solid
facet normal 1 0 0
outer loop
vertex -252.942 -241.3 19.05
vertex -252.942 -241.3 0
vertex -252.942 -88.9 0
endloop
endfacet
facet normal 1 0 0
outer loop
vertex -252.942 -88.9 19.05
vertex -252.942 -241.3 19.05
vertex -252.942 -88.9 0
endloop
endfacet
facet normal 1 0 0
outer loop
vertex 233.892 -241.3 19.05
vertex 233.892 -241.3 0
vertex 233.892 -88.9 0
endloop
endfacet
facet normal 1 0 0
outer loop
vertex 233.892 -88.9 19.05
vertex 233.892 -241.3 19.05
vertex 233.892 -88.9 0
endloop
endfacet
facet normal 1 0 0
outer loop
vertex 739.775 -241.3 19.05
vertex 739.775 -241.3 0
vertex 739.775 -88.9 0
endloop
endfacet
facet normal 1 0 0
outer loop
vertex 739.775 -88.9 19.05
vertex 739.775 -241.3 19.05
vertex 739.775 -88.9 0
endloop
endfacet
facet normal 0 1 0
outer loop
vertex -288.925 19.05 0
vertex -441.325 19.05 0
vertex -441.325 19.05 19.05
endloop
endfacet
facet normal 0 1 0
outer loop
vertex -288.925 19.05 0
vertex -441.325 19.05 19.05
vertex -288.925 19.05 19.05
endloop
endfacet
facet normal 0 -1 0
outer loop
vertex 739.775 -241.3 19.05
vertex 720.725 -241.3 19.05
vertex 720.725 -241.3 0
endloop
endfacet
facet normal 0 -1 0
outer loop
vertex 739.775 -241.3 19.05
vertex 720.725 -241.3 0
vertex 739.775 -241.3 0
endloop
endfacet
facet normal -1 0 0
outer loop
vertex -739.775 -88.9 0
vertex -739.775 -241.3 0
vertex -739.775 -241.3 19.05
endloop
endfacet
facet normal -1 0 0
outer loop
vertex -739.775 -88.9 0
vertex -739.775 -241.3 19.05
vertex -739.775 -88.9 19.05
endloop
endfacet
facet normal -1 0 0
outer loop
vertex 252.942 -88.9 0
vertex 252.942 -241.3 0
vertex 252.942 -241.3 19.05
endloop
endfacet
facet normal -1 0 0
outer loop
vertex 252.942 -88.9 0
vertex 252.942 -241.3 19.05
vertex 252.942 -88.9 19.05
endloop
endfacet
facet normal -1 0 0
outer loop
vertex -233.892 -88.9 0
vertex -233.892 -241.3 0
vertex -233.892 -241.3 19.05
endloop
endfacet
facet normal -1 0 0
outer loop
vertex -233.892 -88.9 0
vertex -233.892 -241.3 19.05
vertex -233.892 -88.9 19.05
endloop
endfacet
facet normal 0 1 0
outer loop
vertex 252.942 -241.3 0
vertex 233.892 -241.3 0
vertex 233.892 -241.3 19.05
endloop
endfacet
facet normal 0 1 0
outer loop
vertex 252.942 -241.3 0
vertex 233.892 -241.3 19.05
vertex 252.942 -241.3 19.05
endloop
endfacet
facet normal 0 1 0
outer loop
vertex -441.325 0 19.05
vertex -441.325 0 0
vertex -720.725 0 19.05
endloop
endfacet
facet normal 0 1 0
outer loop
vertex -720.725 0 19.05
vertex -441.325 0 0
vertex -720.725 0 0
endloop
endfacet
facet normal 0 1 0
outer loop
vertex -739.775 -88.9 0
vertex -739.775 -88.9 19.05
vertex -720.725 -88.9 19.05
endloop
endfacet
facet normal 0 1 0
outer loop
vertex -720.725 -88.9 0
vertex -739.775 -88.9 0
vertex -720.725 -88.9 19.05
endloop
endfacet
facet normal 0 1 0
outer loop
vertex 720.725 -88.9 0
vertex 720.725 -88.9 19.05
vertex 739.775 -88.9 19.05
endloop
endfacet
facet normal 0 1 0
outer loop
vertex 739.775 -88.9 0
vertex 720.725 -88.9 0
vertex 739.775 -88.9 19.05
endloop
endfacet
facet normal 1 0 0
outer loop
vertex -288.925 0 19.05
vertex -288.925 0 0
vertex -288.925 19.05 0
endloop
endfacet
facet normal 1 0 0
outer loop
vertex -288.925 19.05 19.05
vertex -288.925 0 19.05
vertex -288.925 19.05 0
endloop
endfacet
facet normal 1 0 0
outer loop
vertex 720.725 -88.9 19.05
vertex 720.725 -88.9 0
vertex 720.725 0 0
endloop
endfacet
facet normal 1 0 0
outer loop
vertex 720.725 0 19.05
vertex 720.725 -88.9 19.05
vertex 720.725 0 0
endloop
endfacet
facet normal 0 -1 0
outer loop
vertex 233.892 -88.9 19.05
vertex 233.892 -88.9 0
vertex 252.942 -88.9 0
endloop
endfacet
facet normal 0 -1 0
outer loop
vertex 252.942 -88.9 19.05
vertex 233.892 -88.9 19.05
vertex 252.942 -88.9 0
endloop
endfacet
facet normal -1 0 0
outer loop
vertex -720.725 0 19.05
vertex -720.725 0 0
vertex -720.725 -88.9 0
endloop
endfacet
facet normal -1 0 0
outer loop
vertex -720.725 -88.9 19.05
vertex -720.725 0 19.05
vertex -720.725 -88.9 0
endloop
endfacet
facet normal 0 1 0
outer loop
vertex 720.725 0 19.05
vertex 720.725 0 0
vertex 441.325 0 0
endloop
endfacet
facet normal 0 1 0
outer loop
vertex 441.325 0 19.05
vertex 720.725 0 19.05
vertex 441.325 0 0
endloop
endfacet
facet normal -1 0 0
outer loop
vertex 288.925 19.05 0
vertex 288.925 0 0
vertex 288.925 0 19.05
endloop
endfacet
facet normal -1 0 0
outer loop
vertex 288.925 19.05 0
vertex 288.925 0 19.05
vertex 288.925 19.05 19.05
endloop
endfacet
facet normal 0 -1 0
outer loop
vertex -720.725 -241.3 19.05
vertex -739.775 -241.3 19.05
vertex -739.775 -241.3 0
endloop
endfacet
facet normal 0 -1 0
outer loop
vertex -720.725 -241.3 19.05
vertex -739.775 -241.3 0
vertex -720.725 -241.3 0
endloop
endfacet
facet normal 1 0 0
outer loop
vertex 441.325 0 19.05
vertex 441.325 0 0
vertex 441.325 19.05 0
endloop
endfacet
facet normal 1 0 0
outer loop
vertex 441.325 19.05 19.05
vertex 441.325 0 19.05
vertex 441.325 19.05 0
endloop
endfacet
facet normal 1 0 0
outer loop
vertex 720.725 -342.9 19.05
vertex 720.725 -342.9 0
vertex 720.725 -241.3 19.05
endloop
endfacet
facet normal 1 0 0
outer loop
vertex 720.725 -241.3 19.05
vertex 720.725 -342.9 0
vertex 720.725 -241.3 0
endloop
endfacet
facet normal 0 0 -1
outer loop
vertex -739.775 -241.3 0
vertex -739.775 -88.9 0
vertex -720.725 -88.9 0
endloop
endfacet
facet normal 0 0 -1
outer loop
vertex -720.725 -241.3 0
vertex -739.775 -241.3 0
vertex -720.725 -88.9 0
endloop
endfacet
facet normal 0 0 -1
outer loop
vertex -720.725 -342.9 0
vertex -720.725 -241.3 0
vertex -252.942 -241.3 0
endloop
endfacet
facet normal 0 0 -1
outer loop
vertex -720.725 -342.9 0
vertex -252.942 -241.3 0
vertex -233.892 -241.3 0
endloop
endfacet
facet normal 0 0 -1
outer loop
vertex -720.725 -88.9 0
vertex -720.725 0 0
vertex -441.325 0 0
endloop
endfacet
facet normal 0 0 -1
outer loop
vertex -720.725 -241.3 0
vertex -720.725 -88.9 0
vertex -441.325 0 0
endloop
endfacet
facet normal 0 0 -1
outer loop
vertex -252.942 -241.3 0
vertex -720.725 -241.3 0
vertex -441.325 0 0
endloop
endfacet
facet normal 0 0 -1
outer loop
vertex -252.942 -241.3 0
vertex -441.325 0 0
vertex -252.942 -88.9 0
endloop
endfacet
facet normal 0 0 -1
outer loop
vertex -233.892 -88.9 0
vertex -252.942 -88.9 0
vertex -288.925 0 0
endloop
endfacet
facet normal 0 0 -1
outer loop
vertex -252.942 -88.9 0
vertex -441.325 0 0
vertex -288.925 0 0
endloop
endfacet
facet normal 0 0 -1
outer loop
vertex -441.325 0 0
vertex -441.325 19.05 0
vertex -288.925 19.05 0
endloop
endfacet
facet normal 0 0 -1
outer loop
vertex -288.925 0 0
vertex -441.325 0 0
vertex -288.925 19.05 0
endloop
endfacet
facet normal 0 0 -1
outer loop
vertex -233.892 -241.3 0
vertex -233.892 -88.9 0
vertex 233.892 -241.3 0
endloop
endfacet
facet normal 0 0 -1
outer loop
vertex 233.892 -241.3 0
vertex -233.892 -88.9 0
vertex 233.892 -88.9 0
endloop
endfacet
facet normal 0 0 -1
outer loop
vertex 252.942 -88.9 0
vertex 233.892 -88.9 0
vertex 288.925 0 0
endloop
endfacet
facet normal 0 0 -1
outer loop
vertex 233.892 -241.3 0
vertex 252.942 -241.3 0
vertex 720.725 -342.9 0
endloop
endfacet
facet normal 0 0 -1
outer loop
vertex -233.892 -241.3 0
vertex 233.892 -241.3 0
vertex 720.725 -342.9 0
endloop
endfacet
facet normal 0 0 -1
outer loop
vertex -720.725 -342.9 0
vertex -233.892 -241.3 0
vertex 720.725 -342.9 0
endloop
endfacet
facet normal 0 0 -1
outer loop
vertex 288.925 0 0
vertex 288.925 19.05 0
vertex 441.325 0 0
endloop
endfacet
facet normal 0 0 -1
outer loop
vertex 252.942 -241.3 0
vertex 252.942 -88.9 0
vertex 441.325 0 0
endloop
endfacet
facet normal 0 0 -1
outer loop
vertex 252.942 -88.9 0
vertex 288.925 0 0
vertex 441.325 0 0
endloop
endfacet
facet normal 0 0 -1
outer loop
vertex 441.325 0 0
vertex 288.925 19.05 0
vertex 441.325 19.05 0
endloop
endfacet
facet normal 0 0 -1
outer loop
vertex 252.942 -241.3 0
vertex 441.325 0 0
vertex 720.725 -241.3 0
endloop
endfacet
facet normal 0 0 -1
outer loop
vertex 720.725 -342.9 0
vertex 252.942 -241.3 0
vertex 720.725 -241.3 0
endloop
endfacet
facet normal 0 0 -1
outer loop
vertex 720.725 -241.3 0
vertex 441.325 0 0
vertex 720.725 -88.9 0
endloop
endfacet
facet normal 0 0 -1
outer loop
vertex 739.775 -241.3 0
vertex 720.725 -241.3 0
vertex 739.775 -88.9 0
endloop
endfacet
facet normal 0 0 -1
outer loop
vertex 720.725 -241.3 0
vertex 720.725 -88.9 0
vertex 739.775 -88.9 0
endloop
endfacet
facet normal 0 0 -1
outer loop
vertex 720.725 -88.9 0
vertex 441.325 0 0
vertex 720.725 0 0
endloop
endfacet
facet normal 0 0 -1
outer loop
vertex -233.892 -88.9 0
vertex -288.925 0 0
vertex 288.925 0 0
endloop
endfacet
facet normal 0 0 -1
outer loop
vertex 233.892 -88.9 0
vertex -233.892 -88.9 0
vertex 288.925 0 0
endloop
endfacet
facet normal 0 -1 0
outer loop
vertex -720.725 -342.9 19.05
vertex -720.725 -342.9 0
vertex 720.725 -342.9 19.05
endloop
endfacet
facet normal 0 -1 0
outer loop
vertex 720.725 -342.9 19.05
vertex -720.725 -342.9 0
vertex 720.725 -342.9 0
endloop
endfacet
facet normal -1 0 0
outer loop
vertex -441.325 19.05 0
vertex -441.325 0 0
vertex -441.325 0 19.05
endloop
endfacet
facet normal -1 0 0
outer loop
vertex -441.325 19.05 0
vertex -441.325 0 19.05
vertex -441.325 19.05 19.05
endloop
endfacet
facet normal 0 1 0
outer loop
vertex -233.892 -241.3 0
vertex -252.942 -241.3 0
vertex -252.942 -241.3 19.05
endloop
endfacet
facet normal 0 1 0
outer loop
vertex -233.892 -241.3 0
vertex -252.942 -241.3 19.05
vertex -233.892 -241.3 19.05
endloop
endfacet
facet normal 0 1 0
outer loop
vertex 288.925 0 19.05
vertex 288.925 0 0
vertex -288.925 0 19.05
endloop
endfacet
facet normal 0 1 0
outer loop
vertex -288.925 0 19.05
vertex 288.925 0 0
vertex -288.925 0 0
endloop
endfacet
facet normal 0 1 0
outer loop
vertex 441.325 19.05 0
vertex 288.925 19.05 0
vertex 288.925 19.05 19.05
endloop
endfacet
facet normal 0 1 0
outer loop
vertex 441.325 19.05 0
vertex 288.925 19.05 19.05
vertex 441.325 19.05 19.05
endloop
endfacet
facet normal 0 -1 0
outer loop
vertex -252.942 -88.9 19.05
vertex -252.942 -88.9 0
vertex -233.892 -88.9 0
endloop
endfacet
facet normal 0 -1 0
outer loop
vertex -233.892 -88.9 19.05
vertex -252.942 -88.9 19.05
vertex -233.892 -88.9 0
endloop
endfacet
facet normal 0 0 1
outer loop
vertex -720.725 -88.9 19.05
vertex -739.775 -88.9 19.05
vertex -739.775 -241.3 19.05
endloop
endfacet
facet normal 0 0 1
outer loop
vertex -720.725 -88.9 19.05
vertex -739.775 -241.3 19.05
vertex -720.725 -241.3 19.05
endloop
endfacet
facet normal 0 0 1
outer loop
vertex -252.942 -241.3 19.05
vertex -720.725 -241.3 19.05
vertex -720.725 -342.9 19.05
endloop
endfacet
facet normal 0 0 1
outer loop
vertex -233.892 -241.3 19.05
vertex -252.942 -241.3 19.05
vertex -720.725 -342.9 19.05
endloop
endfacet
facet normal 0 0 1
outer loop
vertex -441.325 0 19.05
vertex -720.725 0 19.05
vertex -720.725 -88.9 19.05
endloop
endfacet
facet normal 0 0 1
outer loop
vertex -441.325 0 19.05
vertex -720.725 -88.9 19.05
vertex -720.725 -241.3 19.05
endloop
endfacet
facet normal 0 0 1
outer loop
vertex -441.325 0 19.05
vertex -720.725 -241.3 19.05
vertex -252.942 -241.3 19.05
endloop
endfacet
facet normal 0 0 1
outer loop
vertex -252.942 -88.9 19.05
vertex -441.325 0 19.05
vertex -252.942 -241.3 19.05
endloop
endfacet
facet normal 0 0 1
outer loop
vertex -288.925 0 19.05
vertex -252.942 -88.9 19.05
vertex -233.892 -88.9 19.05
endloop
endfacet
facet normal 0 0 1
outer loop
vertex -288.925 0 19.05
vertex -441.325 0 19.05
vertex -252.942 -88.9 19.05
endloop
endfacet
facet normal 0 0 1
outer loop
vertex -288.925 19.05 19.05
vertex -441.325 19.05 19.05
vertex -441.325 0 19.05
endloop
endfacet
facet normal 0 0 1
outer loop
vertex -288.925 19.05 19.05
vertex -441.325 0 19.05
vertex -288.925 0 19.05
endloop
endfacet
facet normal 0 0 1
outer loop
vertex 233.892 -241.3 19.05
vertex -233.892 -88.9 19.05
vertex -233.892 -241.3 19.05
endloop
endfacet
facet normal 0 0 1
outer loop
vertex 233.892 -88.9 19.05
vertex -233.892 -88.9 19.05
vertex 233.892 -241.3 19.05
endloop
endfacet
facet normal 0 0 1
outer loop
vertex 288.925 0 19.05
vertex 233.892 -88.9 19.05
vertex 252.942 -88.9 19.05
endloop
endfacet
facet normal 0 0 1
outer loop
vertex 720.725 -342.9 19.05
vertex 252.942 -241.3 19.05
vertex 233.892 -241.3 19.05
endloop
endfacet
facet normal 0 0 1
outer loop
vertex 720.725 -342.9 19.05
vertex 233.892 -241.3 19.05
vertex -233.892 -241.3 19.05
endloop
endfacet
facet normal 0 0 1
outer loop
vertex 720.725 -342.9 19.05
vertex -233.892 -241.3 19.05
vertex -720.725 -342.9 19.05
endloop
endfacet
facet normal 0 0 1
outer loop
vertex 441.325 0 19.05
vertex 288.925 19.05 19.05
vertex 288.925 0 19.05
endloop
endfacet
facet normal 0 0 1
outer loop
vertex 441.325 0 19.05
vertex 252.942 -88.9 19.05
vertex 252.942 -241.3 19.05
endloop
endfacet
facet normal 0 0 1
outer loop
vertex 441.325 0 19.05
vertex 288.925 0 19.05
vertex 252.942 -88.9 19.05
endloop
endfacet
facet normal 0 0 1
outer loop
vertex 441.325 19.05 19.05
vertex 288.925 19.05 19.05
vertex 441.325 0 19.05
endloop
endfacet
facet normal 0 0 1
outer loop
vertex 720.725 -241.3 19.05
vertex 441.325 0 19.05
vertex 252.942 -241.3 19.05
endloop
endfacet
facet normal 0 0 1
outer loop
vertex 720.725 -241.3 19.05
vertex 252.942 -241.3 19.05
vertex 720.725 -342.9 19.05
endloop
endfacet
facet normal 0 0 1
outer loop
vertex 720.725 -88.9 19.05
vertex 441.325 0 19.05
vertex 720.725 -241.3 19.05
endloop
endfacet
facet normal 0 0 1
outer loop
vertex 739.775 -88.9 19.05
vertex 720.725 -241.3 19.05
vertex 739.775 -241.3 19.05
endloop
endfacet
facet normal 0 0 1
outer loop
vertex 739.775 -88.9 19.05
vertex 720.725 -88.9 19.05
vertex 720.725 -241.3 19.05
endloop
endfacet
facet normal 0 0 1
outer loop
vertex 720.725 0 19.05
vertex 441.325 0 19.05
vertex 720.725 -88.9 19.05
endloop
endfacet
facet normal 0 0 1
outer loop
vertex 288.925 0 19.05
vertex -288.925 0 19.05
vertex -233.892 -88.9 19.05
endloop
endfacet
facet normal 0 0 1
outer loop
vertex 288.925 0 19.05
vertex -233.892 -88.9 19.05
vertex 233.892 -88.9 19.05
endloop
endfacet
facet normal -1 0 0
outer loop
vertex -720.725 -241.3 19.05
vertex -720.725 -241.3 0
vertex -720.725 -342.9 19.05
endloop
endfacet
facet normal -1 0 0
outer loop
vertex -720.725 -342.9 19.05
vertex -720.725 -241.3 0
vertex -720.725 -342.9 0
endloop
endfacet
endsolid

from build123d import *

# Parameters (mm, degrees)
F0_W     = 19.05
F0_H     = 152.4
F0_W_2   = 152.4
F0_H_2   = 19.05
F1_DEPTH = 19.05


with BuildPart() as f1:
    # F0 (on Top) → F1 (new body)
    with BuildSketch(Plane.XY):
        Polygon((-441.325, 0), (-720.725, 0), (-720.725, -88.9), (-720.725, -241.3), (-720.725, -342.9), (720.725, -342.9), (720.725, -241.3), (720.725, -88.9), (720.725, 0), (441.325, 0), (288.925, 0), (-288.925, 0), align=None)
        with Locations((-243.416667, -165.1)):
            Rectangle(F0_W, F0_H, mode=Mode.SUBTRACT)
        with Locations((243.416667, -165.1)):
            Rectangle(F0_W, F0_H, mode=Mode.SUBTRACT)
        with Locations((-365.125, 9.525)):
            Rectangle(F0_W_2, F0_H_2)
        with Locations((365.125, 9.525)):
            Rectangle(F0_W_2, F0_H_2)
        with Locations((730.25, -165.1)):
            Rectangle(F0_W, F0_H)
        with Locations((-730.25, -165.1)):
            Rectangle(F0_W, F0_H)
    extrude(amount=F1_DEPTH)


solid = f1.part
